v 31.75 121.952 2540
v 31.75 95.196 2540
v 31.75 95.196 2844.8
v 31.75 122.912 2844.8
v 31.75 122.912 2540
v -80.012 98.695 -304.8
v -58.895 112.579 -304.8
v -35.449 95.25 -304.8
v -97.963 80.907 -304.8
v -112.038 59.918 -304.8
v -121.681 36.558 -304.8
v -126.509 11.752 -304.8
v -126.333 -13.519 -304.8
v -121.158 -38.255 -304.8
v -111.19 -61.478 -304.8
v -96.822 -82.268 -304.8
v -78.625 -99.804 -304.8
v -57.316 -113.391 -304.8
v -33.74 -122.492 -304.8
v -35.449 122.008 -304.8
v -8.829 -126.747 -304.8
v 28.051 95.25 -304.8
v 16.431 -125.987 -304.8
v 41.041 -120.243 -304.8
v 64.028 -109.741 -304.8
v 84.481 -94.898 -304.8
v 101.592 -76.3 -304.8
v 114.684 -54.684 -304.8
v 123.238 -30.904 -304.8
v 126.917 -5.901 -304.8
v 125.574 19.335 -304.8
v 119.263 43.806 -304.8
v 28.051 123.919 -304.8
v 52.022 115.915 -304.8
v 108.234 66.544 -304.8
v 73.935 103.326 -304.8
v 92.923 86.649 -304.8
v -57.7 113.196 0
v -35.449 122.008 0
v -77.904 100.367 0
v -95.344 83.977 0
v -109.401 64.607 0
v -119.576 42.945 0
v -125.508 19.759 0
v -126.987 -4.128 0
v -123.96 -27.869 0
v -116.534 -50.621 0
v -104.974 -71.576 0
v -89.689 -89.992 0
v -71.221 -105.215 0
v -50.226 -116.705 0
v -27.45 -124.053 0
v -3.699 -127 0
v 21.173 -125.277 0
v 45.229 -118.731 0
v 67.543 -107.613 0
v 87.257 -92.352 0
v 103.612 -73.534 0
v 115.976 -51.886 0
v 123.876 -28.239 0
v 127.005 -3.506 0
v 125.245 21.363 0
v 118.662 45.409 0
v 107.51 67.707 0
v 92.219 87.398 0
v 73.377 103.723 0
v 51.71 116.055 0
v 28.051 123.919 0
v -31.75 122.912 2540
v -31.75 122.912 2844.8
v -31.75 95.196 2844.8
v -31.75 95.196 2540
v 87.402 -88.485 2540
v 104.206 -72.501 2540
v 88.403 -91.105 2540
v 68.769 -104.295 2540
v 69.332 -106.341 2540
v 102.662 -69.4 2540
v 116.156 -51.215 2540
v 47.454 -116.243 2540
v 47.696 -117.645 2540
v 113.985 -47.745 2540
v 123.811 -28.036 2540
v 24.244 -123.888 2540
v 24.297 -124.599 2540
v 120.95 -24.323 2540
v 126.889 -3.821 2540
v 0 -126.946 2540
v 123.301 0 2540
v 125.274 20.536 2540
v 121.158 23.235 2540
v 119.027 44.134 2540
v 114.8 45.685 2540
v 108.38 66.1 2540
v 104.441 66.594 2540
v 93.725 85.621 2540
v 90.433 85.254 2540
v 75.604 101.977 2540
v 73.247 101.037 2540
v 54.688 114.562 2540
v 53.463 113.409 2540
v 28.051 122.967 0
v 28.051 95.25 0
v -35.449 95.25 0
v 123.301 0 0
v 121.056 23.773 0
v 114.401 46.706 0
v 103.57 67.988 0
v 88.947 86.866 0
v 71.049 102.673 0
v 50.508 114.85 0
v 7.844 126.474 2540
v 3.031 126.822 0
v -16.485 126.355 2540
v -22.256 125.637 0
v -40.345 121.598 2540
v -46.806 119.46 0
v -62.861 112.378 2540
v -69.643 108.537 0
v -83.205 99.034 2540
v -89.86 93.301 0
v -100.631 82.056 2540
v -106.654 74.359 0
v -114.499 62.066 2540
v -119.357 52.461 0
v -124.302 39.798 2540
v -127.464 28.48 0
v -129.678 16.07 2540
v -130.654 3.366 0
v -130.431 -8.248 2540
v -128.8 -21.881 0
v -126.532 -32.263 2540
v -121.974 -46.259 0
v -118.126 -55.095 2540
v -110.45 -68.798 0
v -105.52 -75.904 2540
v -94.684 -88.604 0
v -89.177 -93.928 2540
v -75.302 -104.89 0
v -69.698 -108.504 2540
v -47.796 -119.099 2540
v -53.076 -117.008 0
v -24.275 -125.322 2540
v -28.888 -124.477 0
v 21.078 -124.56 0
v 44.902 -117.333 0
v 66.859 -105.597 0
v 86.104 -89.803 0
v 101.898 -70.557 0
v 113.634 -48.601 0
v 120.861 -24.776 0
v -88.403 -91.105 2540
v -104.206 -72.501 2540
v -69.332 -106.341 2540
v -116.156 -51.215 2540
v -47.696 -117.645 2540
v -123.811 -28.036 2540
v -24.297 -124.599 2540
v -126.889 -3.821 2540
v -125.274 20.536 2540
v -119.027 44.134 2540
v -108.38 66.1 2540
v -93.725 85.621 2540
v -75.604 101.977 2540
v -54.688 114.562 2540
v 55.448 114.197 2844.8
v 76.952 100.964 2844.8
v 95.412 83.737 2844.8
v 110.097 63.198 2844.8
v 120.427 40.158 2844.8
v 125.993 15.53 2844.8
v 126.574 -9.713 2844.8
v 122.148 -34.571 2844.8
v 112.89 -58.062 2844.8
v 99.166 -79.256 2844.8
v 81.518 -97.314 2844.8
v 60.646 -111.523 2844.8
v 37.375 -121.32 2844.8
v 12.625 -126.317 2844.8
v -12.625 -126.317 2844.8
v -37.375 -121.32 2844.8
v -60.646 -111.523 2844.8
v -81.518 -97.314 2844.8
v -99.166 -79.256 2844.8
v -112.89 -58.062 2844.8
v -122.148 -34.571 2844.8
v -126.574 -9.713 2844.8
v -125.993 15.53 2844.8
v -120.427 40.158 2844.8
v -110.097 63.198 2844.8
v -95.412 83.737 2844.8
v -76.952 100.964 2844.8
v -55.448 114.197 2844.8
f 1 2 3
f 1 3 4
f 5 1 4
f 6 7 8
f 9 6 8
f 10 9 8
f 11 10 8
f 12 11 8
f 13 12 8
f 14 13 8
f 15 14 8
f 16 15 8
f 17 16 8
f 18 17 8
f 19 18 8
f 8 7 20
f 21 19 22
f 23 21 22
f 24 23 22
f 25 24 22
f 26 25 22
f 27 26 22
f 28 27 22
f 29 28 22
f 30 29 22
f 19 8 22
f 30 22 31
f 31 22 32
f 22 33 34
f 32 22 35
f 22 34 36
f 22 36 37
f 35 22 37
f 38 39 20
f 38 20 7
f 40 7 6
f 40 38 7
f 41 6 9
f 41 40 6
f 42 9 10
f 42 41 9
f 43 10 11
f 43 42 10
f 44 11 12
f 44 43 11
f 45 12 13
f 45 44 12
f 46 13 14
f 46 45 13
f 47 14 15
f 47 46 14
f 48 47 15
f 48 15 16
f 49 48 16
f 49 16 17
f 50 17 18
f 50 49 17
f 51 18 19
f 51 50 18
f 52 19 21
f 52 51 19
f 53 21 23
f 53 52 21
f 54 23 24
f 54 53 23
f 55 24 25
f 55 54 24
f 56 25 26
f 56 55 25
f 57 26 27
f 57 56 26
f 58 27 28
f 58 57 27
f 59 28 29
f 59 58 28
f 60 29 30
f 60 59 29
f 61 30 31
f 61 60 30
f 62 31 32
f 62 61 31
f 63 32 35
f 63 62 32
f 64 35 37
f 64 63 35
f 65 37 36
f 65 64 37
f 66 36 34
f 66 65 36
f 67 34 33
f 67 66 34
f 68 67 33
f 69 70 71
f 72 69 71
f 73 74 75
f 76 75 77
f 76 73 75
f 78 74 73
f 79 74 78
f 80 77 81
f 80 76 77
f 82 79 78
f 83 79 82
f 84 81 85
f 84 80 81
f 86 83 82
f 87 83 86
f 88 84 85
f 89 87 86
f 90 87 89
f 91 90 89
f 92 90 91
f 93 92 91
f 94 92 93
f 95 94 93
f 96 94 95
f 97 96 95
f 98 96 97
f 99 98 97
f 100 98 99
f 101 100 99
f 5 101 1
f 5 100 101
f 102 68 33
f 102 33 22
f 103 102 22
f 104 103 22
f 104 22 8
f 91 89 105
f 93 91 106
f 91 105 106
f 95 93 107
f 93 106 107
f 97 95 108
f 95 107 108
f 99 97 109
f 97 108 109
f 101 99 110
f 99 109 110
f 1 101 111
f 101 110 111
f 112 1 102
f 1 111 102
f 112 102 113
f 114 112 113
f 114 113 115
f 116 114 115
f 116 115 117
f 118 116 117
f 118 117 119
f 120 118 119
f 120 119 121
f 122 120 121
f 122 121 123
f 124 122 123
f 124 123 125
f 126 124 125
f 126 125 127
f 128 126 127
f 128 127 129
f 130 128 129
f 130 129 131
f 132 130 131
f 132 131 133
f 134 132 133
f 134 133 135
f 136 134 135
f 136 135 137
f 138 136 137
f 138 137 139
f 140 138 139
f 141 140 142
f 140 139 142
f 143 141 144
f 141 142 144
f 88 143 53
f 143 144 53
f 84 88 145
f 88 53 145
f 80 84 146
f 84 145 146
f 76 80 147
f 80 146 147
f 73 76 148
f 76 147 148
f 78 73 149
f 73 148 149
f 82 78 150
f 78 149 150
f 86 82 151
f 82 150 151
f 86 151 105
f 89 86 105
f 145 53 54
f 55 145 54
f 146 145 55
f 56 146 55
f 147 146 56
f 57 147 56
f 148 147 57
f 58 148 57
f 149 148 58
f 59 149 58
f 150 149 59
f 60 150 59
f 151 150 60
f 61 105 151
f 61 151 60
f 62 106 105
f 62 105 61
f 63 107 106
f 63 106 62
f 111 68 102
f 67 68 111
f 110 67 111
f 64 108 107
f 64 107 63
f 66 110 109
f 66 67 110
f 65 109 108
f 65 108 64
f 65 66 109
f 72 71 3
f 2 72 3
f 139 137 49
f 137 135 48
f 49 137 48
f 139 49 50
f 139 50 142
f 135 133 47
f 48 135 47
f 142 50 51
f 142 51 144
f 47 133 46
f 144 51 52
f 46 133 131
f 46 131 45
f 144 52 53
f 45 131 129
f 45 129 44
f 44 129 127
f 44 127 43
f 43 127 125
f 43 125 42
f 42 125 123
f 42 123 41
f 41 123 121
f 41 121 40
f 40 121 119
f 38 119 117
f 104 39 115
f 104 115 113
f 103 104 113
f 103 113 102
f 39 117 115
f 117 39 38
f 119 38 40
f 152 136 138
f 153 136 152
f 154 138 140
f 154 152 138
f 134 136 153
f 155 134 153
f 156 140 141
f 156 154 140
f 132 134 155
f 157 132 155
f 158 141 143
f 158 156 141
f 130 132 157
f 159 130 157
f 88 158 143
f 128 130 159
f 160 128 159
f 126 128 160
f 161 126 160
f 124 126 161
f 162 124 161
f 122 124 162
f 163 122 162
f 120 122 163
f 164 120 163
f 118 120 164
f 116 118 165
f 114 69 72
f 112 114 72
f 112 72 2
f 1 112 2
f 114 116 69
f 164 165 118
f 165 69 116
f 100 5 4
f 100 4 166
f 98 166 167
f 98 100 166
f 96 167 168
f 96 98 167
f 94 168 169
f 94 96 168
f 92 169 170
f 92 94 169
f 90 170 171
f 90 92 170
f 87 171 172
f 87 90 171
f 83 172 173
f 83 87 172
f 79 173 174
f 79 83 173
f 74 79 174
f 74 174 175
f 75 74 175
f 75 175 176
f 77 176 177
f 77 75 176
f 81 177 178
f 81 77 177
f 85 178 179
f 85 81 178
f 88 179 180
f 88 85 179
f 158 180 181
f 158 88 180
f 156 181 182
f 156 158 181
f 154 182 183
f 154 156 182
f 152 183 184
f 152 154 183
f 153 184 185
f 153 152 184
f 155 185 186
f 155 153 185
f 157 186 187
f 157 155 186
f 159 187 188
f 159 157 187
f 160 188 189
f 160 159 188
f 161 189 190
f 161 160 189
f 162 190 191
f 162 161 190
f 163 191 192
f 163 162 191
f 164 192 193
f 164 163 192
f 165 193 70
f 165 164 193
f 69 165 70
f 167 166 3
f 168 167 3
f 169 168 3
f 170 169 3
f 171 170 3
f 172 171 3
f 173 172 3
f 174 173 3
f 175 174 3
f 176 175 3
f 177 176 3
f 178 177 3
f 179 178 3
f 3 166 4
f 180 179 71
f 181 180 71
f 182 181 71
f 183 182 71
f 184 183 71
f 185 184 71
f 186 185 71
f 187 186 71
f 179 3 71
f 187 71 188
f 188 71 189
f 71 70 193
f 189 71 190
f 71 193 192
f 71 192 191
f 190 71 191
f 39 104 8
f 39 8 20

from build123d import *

# Parameters (mm, degrees)
SKETCH2_R           = 127
BOSS_EXTRUDE1_DEPTH = 2540
BOSS_EXTRUDE2_DEPTH = 304.8
BOSS_EXTRUDE3_DEPTH = 304.8


with BuildPart() as part:
    # Sketch2 → Boss-Extrude1 (new body)
    with BuildSketch(Plane.XY):
        with Locations((-3.698748578, 0)):
            Circle(SKETCH2_R)
    extrude(amount=BOSS_EXTRUDE1_DEPTH)

    # Sketch4 → Boss-Extrude2 (add)
    with BuildSketch(Plane.XY.offset(2540)):
        with BuildLine():
            Line((-31.75, 122.911581061), (-31.75, 95.196127389))
            Line((-31.75, 95.196127389), (31.75, 95.196127389))
            Line((31.75, 95.196127389), (31.75, 122.911581061))
            ThreePointArc((31.75, 122.911581061), (0, -126.946127389), (-31.75, 122.911581061))
        make_face()
    extrude(amount=BOSS_EXTRUDE2_DEPTH)

    # Sketch5 → Boss-Extrude3 (add)
    with BuildSketch(Plane(origin=(0, 0, 0), x_dir=(-1, 0, 0), z_dir=(0, 0, -1))):
        with BuildLine():
            Line((-28.051251422, 123.918554037), (-28.051251422, 95.25))
            Line((-28.051251422, 95.25), (35.448748578, 95.25))
            Line((35.448748578, 95.25), (35.448748578, 122.008470875))
            ThreePointArc((35.448748578, 122.008470875), (-3.820058306, -126.996408987), (-28.051251422, 123.918554037))
        make_face()
    extrude(amount=BOSS_EXTRUDE3_DEPTH)


solid = part.part
